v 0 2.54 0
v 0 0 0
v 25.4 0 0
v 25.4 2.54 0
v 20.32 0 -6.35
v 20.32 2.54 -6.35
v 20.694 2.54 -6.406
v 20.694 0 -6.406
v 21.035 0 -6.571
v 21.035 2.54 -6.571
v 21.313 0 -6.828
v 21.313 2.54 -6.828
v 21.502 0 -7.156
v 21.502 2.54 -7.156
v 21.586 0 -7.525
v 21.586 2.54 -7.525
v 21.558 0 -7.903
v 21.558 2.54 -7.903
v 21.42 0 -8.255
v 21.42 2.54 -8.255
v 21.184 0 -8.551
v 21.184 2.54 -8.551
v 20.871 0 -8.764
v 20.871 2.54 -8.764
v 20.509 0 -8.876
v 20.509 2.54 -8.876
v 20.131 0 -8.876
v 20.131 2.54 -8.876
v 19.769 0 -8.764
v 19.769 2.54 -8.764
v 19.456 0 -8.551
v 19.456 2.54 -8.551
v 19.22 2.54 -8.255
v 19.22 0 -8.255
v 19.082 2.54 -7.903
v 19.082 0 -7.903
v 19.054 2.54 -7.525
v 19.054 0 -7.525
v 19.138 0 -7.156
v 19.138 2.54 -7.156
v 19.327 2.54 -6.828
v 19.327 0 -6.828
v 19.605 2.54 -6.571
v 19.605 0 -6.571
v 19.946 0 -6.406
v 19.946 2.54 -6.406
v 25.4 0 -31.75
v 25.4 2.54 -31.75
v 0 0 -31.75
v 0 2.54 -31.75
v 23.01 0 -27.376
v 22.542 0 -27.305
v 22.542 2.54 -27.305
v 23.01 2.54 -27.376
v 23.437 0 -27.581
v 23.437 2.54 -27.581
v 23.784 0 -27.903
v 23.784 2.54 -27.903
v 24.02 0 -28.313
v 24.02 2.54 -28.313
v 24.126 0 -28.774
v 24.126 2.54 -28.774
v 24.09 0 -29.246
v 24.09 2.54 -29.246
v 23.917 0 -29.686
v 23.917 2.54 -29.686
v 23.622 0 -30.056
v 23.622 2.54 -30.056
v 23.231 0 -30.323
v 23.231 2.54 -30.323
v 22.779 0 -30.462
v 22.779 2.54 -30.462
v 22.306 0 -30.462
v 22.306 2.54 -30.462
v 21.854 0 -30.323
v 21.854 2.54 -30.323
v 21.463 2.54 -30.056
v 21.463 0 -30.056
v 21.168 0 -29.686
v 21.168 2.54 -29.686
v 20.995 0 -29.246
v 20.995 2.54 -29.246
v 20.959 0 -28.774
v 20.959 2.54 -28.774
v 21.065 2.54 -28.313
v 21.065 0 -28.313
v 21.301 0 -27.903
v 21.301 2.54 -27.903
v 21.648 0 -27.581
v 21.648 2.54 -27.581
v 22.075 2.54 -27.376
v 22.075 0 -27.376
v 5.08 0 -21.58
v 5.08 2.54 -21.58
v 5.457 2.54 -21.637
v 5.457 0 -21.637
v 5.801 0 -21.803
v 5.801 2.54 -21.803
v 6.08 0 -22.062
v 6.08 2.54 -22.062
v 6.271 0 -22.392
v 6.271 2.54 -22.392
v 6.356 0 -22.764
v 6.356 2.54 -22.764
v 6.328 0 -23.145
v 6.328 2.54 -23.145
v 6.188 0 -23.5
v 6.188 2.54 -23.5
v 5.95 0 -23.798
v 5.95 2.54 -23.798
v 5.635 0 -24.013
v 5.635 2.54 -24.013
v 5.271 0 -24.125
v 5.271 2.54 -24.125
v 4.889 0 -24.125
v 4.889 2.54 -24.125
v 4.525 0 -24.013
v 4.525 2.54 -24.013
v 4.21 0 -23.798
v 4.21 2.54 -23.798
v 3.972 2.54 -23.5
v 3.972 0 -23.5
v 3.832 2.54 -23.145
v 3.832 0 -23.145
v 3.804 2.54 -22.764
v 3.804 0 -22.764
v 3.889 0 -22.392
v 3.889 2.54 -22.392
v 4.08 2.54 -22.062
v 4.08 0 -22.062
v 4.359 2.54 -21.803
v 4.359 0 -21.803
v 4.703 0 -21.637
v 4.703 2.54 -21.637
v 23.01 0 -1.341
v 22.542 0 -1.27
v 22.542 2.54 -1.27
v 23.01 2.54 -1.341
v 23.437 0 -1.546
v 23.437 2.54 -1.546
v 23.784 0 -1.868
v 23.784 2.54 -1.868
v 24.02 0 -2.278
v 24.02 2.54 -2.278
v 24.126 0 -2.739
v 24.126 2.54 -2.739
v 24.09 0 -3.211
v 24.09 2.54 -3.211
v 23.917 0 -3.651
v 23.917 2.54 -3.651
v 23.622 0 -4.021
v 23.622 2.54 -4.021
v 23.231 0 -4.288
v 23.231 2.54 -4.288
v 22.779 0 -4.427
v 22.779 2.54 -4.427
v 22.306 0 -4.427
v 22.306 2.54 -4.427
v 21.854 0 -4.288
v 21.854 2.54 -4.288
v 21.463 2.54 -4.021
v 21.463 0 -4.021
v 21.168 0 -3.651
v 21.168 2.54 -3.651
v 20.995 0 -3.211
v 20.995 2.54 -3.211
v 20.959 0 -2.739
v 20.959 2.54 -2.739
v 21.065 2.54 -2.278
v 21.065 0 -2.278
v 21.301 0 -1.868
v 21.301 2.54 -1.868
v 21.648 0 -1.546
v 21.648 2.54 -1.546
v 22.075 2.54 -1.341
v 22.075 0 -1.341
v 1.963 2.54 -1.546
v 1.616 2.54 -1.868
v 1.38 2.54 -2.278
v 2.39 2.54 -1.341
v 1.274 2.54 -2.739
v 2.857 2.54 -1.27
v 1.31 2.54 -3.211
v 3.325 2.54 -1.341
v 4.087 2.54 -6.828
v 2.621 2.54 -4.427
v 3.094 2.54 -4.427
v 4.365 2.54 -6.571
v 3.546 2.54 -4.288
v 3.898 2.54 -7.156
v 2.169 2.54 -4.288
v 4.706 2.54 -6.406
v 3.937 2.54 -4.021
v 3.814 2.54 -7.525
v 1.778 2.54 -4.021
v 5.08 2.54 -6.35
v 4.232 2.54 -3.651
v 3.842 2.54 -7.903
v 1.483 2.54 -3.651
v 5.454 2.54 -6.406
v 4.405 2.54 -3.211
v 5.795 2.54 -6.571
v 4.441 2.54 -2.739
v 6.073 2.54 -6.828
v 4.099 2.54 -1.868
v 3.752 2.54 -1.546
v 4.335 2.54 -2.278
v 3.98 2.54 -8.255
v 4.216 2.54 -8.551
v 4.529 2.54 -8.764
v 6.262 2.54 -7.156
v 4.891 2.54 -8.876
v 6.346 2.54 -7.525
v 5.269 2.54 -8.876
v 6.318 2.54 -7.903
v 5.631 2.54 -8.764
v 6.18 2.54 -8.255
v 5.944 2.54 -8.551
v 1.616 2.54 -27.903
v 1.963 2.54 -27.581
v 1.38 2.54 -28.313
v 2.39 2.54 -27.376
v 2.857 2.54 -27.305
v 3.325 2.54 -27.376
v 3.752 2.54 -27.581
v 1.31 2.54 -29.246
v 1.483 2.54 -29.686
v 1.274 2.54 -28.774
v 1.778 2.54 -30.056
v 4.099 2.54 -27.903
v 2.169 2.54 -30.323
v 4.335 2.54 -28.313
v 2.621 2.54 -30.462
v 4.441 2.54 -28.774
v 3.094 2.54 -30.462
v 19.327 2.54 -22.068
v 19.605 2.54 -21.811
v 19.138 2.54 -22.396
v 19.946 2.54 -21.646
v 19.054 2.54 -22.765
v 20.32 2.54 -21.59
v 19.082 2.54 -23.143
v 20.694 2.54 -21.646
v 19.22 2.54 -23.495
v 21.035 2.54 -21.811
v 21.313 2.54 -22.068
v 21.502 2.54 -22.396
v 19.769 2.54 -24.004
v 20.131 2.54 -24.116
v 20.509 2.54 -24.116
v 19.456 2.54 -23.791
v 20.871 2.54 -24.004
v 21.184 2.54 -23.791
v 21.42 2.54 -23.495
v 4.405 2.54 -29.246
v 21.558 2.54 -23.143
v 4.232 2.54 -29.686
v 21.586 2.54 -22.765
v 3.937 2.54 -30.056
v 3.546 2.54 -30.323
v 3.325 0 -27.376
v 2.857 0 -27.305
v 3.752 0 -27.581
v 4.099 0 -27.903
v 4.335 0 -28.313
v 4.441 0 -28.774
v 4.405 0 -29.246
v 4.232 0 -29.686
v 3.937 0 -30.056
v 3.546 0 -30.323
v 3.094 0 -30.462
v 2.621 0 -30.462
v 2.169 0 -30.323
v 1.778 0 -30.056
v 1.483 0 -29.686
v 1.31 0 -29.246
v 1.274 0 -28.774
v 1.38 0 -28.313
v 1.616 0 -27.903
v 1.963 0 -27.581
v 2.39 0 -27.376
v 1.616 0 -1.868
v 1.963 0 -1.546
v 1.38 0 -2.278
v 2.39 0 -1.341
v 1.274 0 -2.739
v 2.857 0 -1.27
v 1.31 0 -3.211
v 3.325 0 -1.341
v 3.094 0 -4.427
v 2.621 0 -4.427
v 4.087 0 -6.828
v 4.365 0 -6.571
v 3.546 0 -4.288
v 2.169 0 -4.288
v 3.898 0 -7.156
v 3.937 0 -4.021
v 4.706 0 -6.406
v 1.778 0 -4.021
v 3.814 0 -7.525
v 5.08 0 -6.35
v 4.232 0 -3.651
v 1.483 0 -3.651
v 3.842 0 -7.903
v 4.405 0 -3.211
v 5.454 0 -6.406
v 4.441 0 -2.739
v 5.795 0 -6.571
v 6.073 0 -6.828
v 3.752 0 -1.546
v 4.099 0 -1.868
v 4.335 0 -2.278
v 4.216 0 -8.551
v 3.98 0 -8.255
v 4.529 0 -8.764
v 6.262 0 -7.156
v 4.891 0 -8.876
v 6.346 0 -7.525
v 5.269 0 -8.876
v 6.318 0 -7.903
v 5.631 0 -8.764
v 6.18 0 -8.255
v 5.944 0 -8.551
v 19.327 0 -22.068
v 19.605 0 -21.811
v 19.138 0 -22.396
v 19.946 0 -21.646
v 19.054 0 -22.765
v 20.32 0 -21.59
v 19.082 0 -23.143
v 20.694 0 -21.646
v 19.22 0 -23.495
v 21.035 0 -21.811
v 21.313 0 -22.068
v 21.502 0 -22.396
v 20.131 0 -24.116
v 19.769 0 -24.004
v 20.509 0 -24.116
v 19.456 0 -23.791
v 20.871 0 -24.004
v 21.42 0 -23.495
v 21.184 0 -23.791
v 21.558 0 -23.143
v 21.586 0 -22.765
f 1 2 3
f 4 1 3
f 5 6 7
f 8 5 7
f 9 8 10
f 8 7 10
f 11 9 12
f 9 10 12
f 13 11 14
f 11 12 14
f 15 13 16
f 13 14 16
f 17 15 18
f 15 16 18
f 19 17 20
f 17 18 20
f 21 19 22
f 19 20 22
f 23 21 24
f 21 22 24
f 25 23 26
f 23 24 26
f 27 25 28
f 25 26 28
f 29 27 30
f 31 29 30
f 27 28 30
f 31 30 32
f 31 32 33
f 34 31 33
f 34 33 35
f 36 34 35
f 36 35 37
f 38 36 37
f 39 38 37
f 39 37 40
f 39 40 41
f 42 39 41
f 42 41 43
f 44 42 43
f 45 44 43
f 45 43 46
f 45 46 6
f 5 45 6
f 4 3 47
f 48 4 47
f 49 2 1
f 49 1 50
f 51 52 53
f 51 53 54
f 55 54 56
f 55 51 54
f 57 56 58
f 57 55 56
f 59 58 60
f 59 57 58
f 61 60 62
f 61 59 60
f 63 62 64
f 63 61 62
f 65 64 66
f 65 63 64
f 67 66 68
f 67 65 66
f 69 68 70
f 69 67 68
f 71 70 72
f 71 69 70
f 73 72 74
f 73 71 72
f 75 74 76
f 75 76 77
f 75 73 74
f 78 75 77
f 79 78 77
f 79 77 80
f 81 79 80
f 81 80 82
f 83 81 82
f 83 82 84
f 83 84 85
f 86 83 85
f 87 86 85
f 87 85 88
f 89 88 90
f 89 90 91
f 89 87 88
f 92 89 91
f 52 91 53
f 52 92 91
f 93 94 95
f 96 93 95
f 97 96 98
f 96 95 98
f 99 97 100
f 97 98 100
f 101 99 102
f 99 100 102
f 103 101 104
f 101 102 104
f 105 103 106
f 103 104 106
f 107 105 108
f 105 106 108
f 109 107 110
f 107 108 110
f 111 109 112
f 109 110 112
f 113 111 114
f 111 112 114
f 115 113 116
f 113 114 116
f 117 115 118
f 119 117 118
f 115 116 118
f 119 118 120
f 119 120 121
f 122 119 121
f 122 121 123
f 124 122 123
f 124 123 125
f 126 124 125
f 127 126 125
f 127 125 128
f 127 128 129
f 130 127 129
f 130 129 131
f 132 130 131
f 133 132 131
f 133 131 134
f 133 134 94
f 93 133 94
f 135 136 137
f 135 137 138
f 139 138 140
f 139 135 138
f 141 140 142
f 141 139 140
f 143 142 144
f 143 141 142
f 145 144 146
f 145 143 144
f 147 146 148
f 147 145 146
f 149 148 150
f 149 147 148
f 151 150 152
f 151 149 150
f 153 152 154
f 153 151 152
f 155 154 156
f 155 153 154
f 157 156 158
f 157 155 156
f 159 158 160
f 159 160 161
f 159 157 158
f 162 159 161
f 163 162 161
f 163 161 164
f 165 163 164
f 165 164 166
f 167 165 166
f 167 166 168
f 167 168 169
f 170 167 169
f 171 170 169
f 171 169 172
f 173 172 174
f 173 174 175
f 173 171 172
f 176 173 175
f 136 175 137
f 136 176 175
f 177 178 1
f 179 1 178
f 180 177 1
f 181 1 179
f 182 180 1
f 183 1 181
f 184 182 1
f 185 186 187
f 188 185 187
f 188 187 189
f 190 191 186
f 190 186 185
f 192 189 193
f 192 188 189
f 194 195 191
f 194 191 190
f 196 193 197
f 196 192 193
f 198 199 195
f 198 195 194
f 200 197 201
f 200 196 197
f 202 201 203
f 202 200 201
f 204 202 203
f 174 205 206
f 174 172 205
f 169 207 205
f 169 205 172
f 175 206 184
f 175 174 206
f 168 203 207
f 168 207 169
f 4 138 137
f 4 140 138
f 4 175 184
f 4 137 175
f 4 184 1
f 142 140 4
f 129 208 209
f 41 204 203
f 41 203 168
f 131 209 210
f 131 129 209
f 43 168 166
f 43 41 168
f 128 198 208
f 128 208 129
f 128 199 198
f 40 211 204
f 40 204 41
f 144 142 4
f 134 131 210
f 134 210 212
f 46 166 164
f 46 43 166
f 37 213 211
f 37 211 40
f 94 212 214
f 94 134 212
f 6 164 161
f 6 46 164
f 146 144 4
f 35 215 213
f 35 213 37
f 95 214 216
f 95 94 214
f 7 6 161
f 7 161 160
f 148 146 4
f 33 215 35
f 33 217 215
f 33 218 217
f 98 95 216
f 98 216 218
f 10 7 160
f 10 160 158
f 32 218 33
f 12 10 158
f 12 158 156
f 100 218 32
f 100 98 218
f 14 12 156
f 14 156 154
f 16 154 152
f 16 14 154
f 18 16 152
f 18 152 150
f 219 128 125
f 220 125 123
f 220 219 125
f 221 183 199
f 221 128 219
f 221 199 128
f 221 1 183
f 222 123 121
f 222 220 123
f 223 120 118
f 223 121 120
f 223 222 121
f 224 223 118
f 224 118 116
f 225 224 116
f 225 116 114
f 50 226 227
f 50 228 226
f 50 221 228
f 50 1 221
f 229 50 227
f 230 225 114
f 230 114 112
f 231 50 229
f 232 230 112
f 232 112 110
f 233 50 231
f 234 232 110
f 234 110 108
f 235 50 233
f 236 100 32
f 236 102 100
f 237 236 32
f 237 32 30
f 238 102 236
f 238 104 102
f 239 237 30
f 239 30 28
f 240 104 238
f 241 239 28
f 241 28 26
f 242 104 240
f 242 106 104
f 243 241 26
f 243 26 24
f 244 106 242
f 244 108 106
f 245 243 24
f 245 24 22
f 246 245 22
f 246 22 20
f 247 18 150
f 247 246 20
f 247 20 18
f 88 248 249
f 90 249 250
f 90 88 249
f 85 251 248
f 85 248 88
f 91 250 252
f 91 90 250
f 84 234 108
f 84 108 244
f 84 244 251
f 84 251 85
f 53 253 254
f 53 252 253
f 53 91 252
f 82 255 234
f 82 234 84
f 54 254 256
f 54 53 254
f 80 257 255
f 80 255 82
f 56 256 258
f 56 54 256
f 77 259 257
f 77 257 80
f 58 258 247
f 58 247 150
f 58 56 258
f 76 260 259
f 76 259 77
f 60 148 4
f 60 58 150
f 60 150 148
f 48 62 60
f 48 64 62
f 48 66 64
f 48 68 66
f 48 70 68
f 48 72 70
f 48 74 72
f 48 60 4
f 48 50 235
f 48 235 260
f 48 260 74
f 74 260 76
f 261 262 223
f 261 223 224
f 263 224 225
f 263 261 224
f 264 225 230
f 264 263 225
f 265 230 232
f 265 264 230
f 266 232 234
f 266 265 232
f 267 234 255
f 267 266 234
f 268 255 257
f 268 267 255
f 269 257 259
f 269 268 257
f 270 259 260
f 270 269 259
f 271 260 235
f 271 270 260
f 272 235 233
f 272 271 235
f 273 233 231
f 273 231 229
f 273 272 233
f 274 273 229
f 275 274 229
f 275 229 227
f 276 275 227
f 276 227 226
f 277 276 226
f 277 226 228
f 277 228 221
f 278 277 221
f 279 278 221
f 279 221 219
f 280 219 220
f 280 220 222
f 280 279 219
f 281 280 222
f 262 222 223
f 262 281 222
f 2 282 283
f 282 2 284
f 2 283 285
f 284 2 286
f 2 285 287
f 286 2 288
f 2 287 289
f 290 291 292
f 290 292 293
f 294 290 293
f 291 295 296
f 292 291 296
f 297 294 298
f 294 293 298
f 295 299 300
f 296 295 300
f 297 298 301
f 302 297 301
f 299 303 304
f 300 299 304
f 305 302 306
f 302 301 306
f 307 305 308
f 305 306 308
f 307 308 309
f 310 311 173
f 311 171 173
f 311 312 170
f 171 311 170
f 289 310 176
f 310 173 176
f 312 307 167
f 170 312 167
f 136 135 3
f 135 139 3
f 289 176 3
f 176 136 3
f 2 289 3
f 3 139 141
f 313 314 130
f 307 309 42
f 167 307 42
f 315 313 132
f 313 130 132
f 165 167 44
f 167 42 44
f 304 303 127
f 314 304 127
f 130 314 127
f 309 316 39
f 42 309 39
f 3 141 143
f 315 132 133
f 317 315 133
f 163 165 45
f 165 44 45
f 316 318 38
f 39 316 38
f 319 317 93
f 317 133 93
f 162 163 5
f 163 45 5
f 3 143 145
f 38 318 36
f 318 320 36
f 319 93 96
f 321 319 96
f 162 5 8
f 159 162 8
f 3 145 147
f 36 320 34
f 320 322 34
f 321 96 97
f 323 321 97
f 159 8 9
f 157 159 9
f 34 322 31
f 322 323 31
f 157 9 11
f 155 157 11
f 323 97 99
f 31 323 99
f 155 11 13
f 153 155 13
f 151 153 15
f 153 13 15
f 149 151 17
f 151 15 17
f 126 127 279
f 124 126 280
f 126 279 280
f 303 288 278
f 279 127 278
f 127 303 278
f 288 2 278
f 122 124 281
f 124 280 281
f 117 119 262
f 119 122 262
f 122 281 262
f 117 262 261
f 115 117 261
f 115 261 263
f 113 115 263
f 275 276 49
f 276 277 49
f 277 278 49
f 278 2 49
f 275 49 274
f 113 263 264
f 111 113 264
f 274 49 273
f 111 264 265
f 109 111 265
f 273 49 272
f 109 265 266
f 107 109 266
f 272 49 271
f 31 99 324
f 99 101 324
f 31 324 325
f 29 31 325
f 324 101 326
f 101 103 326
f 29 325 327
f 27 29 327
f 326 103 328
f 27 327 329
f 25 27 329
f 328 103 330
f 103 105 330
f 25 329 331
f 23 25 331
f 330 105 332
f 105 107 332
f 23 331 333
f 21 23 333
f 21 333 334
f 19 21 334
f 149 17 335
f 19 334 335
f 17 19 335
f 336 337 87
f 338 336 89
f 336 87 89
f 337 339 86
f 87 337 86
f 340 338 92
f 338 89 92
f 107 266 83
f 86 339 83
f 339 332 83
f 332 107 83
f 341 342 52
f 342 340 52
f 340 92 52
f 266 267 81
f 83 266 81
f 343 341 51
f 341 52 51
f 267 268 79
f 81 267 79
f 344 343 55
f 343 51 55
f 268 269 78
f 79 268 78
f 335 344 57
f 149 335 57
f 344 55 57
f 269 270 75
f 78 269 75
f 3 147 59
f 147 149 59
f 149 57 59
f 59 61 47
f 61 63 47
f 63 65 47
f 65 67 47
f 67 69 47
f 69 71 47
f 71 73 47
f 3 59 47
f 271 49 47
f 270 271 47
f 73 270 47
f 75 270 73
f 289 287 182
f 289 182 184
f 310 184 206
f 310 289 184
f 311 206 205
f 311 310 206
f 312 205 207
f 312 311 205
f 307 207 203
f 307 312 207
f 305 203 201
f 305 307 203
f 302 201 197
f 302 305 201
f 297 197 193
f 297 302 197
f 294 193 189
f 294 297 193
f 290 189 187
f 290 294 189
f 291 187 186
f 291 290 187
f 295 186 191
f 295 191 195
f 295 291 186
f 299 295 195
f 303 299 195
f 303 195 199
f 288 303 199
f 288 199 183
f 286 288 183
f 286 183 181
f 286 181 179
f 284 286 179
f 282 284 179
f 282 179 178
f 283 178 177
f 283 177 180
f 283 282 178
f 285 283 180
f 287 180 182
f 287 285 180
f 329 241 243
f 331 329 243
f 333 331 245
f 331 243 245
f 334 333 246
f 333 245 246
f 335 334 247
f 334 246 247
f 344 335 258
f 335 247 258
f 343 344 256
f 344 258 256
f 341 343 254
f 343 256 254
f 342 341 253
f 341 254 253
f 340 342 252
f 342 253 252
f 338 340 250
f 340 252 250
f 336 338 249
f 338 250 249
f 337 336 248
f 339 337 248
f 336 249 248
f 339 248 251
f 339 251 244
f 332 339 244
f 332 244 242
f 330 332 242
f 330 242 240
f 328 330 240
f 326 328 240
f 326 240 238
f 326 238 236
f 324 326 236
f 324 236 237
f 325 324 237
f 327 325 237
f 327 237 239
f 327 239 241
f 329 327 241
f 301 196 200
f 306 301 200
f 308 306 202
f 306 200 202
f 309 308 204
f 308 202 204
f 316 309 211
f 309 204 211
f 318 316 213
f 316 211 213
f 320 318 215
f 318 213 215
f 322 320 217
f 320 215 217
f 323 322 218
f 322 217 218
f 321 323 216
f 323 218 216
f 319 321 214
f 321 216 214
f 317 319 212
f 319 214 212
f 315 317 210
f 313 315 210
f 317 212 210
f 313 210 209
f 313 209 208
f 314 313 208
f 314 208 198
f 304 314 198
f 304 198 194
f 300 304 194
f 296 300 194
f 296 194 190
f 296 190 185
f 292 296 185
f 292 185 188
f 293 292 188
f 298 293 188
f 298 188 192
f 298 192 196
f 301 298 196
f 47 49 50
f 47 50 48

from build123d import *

# Parameters (mm, degrees)
SKETCH1_W           = 25.4
SKETCH1_H           = 31.75
SKETCH1_R           = 1.5875
BOSS_EXTRUDE1_DEPTH = 2.54
SKETCH2_R           = 1.27966848
SKETCH2_R_2         = 1.27
CUT_EXTRUDE1_DEPTH  = 41.739097928


with BuildPart() as part:
    # Sketch1 → Boss-Extrude1 (new body)
    with BuildSketch(Plane(origin=(0, 0, 0), x_dir=(1, 0, 0), z_dir=(0, 1, 0))):
        with Locations((12.7, 15.875)):
            Rectangle(SKETCH1_W, SKETCH1_H)
        with Locations(Location((2.8575, 28.8925, 0), (0, 0, 270))):
            Circle(SKETCH1_R, mode=Mode.SUBTRACT)
        with Locations(Location((22.5425, 28.8925, 0), (0, 0, 270))):
            Circle(SKETCH1_R, mode=Mode.SUBTRACT)
        with Locations(Location((2.8575, 2.8575, 0), (0, 0, 270))):
            Circle(SKETCH1_R, mode=Mode.SUBTRACT)
        with Locations(Location((22.5425, 2.8575, 0), (0, 0, 270))):
            Circle(SKETCH1_R, mode=Mode.SUBTRACT)
    extrude(amount=BOSS_EXTRUDE1_DEPTH)

    # Sketch2 → Cut-Extrude1 (cut, through all)
    with BuildSketch(Plane(origin=(0, 2.54, 0), x_dir=(1, 0, 0), z_dir=(0, 1, 0))):
        with Locations(Location((5.08, 22.86, 0), (0, 0, 270))):
            Circle(SKETCH2_R)
        with Locations(Location((20.32, 22.86, 0), (0, 0, 270))):
            Circle(SKETCH2_R_2)
        with Locations(Location((5.08, 7.62, 0), (0, 0, 270))):
            Circle(SKETCH2_R_2)
        with Locations(Location((20.32, 7.62, 0), (0, 0, 270))):
            Circle(SKETCH2_R_2)
    extrude(amount=-CUT_EXTRUDE1_DEPTH, mode=Mode.SUBTRACT)


solid = part.part
